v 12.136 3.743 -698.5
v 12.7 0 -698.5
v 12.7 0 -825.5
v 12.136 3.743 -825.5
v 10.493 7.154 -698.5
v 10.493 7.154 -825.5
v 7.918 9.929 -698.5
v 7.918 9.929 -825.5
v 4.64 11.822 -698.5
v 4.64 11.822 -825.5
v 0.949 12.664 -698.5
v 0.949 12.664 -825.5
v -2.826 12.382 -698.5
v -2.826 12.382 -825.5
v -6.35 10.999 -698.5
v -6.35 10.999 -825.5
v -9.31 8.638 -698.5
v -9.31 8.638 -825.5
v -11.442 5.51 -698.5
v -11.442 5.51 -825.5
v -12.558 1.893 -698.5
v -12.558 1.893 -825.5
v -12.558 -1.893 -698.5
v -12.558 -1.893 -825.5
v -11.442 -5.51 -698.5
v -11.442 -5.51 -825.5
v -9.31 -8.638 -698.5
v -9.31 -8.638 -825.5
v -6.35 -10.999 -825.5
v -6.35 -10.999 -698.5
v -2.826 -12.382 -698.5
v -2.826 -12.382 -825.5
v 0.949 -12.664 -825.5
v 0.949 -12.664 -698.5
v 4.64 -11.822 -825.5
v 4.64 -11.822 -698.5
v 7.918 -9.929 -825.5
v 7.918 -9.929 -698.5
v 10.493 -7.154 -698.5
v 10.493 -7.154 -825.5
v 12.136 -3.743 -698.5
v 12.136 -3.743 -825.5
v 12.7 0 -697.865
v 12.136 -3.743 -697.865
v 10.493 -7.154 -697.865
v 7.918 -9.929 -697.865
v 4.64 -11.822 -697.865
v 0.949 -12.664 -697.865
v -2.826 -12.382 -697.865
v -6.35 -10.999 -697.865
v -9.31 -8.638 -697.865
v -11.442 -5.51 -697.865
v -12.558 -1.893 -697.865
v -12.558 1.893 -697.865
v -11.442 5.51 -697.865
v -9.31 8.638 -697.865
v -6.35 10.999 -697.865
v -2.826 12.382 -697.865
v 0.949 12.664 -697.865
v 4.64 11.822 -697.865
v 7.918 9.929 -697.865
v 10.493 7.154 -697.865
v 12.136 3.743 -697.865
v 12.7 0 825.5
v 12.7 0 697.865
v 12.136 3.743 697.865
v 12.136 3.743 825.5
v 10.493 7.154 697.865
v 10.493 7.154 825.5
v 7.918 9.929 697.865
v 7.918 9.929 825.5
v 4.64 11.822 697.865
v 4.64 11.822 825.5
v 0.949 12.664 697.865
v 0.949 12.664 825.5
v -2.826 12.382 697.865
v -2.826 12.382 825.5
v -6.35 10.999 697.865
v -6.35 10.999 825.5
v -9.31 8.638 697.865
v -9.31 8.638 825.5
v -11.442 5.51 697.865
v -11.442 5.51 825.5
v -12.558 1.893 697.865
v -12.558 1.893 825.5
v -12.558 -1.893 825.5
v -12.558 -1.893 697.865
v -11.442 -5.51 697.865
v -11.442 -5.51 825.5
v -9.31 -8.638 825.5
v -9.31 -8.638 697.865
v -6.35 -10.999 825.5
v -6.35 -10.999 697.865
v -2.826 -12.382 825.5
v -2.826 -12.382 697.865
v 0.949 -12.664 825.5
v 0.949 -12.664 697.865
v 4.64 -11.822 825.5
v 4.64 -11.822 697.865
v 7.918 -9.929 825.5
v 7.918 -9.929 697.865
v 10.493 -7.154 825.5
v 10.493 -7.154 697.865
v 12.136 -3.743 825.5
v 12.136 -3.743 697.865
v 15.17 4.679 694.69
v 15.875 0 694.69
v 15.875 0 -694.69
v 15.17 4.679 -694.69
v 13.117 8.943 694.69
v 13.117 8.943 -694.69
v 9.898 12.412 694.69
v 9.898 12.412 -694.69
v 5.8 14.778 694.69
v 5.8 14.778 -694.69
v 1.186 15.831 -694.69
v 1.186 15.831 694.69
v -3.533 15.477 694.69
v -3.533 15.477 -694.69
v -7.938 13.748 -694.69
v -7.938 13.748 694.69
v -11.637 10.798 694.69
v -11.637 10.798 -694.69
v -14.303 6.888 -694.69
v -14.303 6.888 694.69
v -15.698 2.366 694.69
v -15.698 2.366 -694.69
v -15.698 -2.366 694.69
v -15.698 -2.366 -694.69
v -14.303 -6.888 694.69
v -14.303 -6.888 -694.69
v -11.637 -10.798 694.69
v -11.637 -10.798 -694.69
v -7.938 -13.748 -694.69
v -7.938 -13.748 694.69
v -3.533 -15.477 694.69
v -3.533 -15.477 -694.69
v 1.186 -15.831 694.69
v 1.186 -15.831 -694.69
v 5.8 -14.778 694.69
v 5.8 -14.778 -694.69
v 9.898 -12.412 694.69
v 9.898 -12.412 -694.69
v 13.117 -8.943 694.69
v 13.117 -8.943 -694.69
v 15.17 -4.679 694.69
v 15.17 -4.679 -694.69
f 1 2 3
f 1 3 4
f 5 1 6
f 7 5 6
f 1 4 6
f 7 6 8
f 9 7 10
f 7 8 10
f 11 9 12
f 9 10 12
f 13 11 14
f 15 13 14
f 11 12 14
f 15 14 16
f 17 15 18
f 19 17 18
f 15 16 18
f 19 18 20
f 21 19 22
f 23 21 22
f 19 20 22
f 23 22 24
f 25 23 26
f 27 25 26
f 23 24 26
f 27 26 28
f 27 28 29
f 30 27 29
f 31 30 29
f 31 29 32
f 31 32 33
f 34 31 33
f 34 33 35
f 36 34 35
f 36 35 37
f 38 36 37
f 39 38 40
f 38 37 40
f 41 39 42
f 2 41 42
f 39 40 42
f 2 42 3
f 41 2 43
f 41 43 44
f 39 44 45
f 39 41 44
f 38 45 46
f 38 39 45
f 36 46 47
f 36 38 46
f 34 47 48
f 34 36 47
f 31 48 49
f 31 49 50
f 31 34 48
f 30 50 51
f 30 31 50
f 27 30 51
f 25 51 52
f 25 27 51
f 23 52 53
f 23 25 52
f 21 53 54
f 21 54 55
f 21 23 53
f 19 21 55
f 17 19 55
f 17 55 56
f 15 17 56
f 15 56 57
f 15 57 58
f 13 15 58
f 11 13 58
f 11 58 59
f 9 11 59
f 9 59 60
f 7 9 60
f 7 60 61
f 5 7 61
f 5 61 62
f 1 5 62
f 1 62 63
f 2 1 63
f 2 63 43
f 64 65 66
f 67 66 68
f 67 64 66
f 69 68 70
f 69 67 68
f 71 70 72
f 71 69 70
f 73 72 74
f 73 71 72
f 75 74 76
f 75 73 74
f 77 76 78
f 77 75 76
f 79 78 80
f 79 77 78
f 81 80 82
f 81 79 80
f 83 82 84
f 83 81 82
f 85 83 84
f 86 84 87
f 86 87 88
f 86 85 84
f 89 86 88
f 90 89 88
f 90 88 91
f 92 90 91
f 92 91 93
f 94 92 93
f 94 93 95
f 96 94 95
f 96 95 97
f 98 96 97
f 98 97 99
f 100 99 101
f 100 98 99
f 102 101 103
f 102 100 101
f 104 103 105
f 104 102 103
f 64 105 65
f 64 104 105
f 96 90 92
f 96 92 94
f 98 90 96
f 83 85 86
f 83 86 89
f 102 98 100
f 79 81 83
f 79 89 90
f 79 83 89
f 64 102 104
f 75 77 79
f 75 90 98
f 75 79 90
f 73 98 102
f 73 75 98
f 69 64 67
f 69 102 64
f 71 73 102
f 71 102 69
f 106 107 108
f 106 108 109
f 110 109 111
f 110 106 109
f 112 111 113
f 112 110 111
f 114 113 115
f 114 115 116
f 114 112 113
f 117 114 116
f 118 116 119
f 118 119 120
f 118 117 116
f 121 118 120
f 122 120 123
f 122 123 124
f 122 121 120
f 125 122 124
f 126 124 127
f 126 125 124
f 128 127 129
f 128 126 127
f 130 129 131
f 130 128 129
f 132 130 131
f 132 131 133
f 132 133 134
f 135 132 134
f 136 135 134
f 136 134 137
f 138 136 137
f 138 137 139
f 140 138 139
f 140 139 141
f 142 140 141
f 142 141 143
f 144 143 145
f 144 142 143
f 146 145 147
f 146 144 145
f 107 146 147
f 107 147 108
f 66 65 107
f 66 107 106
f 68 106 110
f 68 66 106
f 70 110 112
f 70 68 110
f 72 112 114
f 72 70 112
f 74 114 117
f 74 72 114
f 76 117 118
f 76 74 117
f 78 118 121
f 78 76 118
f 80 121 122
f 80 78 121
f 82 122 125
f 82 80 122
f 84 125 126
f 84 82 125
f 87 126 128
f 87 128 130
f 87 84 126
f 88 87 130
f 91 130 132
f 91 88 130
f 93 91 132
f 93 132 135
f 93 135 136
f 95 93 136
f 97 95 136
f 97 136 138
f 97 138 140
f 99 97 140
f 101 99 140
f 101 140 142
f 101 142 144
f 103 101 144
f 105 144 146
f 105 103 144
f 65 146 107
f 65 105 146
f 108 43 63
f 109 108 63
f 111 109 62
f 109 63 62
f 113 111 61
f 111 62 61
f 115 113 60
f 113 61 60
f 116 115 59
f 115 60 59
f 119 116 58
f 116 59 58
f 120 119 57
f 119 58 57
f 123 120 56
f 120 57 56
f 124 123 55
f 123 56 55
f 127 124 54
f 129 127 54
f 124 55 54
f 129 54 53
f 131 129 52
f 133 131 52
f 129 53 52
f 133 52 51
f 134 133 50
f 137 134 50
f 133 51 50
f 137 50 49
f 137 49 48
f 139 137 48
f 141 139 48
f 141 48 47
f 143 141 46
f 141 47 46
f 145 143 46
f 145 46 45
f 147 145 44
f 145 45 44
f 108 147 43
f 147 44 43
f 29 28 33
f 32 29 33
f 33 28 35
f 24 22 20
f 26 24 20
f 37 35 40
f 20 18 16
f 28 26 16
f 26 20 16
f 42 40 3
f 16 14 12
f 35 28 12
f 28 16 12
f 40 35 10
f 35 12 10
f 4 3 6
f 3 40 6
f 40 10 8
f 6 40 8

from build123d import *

# Parameters (mm, degrees)
SKETCH1_R           = 15.875
BOSS_EXTRUDE1_DEPTH = 825.5
SKETCH2_R           = 22.711063055
SKETCH2_R_2         = 12.7
CUT_EXTRUDE1_DEPTH  = 127
CHAMFER1_SIZE       = 3.81


with BuildPart() as part:
    # Sketch1 → Boss-Extrude1 (new, symmetric)
    with BuildSketch(Plane.XY):
        Circle(SKETCH1_R)
    extrude(amount=BOSS_EXTRUDE1_DEPTH, both=True)

    # Sketch2 → Cut-Extrude1 (cut)
    with BuildSketch(Plane.XY.offset(825.5)):
        Circle(SKETCH2_R)
        Circle(SKETCH2_R_2, mode=Mode.SUBTRACT)
    cut_extrude1 = extrude(amount=-CUT_EXTRUDE1_DEPTH, mode=Mode.SUBTRACT)

    # Mirror1: Cut-Extrude1 across plane
    add(cut_extrude1.mirror(Plane.XY), mode=Mode.SUBTRACT)

    # Chamfer1
    # the kernel refuses this chamfer: 3.81 mm, written as the material it takes off along each edge
    with BuildSketch(Plane(origin=(0, 0, -698.5), x_dir=(1, 0, 0), z_dir=(0, -1, 0))) as chamfer1_piece_1_section:
        Polygon((15.875, CHAMFER1_SIZE), (15.875 - CHAMFER1_SIZE, 0), (15.875, 0), align=None)
    chamfer1_piece_1 = revolve(axis=Axis((0, 0, -698.5), (0, 0, 1)), mode=Mode.PRIVATE)
    chamfer1_piece_1 = chamfer1_piece_1 - Plane(origin=(0, 0, -696.286679129), x_dir=(1, 0, 0), z_dir=(0, 0, -1)) * Cylinder(12.7, 64, mode=Mode.PRIVATE)
    add(chamfer1_piece_1, mode=Mode.SUBTRACT)
    with BuildSketch(Plane(origin=(0, 0, 698.5), x_dir=(1, 0, 0), z_dir=(0, -1, 0))) as chamfer1_piece_2_section:
        Polygon((15.875, -CHAMFER1_SIZE), (15.875 - CHAMFER1_SIZE, 0), (15.875, 0), align=None)
    chamfer1_piece_2 = revolve(axis=Axis((0, 0, 698.5), (0, 0, 1)), mode=Mode.PRIVATE)
    chamfer1_piece_2 = chamfer1_piece_2 - Plane(origin=(0, 0, 696.286679129), x_dir=(1, 0, 0), z_dir=(0, 0, 1)) * Cylinder(12.7, 64, mode=Mode.PRIVATE)
    add(chamfer1_piece_2, mode=Mode.SUBTRACT)


solid = part.part
